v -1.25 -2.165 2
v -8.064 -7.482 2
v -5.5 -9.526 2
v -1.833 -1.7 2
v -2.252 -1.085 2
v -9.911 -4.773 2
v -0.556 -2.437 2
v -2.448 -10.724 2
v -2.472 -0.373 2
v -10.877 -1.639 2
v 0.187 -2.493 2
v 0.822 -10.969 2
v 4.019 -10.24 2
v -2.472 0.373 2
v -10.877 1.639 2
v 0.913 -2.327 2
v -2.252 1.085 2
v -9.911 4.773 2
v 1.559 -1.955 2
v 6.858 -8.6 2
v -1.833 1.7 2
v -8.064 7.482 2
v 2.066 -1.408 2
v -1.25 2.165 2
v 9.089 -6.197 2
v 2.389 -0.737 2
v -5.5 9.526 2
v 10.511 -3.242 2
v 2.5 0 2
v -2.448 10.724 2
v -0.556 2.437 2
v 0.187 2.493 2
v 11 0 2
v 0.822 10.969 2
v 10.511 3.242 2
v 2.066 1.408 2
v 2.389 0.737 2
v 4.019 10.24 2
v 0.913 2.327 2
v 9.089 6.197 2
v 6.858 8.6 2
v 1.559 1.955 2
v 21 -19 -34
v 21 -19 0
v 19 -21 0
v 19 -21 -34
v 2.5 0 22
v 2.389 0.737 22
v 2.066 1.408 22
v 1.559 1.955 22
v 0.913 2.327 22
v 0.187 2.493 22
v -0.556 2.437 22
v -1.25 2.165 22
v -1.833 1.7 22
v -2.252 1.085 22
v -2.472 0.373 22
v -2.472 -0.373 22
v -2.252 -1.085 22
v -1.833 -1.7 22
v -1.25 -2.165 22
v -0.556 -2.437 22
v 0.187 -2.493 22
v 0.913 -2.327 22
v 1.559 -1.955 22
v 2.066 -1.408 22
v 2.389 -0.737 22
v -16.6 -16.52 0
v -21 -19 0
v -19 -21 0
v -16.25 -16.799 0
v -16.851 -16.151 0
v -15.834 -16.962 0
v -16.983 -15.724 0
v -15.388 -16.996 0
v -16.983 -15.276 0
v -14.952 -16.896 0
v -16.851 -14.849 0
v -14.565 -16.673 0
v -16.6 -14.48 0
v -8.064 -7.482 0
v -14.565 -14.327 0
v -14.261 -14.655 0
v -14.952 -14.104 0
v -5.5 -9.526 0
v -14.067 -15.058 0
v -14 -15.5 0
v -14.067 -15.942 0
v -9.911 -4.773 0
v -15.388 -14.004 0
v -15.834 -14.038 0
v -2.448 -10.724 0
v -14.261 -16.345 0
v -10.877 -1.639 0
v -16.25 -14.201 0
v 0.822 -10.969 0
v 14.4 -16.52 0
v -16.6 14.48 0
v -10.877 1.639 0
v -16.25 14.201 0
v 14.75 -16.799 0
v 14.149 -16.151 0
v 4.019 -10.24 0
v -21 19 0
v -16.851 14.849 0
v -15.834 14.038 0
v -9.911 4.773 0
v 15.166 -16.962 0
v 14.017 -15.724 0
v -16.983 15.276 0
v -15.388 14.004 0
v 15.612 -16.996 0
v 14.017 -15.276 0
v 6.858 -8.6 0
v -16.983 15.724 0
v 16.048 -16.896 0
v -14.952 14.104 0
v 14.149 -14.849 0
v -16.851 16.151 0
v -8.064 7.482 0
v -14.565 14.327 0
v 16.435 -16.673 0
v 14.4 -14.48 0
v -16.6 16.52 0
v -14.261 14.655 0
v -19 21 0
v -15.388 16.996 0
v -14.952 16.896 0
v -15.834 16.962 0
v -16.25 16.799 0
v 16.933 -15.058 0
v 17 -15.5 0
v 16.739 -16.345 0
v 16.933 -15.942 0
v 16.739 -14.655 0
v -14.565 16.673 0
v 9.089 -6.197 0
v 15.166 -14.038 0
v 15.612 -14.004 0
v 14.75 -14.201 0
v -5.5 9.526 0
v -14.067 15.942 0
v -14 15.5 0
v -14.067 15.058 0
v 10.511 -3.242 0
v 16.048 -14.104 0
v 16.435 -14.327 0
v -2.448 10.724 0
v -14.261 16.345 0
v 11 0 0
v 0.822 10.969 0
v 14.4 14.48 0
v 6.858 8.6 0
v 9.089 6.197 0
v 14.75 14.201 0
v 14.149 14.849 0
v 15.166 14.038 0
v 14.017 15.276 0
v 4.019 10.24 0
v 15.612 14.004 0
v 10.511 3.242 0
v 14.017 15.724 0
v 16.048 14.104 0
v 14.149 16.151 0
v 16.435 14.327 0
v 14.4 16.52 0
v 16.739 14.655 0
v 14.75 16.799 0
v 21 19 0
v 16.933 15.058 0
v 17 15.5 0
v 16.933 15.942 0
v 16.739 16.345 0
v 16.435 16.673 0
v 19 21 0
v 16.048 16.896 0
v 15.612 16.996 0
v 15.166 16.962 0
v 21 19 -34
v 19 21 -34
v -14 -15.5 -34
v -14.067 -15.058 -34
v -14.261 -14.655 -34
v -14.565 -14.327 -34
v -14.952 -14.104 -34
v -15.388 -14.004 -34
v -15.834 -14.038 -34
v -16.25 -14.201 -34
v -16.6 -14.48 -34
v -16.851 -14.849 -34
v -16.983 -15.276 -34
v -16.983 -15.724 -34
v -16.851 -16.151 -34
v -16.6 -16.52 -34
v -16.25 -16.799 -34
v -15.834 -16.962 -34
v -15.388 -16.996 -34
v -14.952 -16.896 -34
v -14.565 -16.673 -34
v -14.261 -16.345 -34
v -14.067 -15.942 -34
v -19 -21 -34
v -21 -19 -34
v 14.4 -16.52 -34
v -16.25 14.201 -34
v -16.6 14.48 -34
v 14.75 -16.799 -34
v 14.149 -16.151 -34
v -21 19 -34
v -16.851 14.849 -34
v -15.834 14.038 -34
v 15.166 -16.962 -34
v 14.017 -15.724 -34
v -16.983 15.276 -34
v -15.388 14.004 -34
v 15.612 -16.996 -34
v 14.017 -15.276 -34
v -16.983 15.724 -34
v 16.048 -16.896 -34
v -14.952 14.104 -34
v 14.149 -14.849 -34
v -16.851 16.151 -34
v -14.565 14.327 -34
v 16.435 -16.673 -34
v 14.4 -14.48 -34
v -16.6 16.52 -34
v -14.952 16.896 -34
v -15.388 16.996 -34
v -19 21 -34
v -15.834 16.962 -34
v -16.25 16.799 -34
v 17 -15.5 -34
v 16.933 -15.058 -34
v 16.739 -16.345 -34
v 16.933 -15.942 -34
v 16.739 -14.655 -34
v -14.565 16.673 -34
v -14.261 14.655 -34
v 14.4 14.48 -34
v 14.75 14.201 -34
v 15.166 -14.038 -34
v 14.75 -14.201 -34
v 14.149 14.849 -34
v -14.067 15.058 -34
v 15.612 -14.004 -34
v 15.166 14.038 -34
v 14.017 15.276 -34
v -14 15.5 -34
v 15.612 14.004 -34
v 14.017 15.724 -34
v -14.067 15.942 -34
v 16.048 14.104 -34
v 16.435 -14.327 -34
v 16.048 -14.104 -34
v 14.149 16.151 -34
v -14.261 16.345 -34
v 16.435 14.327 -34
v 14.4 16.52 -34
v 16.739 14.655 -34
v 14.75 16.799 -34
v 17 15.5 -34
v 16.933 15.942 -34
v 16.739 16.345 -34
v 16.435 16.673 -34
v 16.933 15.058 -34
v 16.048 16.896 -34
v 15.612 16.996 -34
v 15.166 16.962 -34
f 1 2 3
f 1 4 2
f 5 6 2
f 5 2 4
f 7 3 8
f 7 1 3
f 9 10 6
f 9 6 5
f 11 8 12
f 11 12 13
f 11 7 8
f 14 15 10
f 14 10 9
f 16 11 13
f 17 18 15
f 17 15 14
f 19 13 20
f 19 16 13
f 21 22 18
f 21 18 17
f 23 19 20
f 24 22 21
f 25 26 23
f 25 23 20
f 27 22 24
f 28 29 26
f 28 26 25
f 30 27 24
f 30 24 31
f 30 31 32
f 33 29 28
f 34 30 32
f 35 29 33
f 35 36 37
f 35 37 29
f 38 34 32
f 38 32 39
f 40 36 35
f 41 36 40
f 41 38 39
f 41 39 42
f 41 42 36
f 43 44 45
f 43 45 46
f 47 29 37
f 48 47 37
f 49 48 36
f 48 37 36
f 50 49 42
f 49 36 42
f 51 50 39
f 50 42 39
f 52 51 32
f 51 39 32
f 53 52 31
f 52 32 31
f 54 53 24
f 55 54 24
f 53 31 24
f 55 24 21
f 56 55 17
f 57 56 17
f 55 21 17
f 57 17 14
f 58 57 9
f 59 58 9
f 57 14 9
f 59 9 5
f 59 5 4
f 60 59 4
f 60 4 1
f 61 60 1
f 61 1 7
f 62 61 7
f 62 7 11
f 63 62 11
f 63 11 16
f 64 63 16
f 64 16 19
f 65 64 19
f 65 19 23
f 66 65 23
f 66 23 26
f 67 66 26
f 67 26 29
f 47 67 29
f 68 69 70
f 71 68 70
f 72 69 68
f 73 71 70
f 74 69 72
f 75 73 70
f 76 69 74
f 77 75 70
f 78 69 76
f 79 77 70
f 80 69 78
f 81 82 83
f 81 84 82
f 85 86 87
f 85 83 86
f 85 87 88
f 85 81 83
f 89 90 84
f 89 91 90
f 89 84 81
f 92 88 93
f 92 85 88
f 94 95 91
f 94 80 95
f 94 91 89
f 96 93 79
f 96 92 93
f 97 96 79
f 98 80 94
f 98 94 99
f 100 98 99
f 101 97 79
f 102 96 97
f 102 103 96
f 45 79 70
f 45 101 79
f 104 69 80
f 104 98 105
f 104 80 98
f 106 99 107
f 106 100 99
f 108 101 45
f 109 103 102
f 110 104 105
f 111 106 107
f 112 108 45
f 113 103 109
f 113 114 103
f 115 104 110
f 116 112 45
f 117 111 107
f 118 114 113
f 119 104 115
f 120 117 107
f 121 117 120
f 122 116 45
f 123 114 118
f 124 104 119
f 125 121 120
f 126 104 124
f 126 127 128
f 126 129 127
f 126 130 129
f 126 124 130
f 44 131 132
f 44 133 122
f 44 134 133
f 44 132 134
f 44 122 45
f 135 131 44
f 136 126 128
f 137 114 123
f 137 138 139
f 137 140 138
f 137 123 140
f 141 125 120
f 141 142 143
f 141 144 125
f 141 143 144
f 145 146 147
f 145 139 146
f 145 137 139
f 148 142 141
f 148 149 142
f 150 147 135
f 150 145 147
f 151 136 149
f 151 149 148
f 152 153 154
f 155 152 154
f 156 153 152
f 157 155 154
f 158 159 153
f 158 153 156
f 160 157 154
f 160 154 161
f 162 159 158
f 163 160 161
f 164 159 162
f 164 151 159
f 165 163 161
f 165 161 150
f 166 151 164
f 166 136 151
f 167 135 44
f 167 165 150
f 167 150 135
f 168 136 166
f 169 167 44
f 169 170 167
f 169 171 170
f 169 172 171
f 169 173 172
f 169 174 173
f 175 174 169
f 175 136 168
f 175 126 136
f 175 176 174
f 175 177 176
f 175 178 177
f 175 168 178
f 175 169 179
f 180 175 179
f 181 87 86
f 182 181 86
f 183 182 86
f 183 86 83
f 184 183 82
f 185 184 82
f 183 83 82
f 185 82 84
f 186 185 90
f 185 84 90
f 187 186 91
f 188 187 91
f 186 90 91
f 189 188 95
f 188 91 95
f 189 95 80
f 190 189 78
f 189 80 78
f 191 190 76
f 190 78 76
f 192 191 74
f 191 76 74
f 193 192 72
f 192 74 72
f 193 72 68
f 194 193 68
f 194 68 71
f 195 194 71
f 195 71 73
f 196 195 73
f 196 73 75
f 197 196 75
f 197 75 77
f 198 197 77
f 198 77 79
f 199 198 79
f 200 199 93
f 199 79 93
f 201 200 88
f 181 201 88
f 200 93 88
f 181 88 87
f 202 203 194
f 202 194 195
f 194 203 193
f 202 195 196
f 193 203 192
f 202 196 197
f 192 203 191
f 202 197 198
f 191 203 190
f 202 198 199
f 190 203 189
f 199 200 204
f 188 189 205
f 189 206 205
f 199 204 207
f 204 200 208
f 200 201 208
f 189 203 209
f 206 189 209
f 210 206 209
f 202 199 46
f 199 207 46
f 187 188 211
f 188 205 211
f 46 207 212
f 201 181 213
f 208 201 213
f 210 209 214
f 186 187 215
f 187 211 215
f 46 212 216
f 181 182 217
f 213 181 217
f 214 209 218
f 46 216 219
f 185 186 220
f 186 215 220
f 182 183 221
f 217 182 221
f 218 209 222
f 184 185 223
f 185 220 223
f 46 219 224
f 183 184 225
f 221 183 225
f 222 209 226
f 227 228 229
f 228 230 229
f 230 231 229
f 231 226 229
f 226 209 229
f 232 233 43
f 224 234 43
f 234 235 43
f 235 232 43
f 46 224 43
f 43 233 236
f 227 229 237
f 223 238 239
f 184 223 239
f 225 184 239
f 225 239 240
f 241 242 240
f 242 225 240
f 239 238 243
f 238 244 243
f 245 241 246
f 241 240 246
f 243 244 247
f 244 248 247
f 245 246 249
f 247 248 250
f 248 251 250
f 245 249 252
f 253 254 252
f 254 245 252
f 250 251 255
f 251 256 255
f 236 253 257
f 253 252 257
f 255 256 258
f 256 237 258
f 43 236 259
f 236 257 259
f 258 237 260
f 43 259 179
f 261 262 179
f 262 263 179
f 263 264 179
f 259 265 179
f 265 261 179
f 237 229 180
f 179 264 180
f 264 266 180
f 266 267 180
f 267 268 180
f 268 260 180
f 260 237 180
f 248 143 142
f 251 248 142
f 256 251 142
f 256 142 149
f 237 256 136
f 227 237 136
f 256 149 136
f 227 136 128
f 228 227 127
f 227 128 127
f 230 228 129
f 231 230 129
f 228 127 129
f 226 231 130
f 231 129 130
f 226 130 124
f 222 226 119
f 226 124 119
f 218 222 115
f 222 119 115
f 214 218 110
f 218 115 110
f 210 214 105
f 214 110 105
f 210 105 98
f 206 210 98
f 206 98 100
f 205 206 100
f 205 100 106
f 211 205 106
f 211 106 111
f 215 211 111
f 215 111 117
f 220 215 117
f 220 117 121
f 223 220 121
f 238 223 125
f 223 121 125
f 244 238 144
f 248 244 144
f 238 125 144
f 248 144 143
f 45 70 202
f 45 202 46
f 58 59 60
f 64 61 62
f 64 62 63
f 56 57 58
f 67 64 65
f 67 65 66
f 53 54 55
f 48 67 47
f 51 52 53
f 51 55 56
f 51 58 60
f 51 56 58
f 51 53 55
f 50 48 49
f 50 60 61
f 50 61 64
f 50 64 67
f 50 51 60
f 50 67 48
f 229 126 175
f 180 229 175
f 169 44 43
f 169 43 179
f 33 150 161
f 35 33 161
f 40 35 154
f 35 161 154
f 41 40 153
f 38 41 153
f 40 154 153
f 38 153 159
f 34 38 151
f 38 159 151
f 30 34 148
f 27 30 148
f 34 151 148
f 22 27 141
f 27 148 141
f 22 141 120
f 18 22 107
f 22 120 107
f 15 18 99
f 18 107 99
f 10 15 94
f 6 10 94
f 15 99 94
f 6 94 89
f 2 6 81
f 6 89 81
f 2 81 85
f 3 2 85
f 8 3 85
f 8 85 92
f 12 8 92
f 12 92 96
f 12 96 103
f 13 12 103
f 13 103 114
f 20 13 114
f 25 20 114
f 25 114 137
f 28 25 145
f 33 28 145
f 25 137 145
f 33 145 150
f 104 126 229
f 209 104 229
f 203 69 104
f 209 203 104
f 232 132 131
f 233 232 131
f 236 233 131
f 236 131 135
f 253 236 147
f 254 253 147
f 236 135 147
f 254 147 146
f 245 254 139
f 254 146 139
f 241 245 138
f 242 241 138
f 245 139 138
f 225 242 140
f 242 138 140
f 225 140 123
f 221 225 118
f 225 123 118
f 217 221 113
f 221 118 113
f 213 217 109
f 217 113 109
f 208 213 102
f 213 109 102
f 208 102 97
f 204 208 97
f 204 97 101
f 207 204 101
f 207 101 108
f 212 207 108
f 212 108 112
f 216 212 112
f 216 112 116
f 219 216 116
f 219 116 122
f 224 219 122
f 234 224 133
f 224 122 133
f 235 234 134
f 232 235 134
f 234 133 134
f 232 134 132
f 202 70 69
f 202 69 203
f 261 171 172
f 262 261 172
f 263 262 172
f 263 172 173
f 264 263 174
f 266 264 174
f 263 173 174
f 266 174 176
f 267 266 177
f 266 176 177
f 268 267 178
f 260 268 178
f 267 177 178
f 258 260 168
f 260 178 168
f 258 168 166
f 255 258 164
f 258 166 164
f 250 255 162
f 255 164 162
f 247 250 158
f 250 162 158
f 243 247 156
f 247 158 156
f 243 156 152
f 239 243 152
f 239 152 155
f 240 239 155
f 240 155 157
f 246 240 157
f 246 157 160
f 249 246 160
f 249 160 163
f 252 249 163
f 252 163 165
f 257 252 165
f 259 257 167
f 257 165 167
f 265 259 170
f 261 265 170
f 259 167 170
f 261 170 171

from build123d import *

# Parameters (mm, degrees)
SKETCH_1_W      = 42
SKETCH_1_H      = 42
SKETCH_1_R      = 1.5
EXTRUDE_1_DEPTH = 34
SKETCH_1_3_R    = 11
EXTRUDE_2_DEPTH = 2
SKETCH_1_4_R    = 2.5
EXTRUDE_3_DEPTH = 22
CHAMFER_1_SIZE  = 2


with BuildPart() as part:
    # 스케치1 → 보스-돌출1 (new body)
    with BuildSketch(Plane.XY):
        Rectangle(SKETCH_1_W, SKETCH_1_H)
        with Locations((-15.5, -15.5)):
            Circle(SKETCH_1_R, mode=Mode.SUBTRACT)
        with Locations((15.5, -15.5)):
            Circle(SKETCH_1_R, mode=Mode.SUBTRACT)
        with Locations((-15.5, 15.5)):
            Circle(SKETCH_1_R, mode=Mode.SUBTRACT)
        with Locations((15.5, 15.5)):
            Circle(SKETCH_1_R, mode=Mode.SUBTRACT)
    extrude(amount=-EXTRUDE_1_DEPTH)

    # 스케치1<3> → 보스-돌출2 (add)
    with BuildSketch(Plane.XY):
        Circle(SKETCH_1_3_R)
    extrude(amount=EXTRUDE_2_DEPTH)

    # 스케치1<4> → 보스-돌출3 (add)
    with BuildSketch(Plane.XY):
        Circle(SKETCH_1_4_R)
    extrude(amount=EXTRUDE_3_DEPTH)

    # 모따기1
    chamfer_1_edges = [part.edges().sort_by_distance(p)[0] for p in [
        (-21, 21, -17),
        (21, 21, -17),
        (21, -21, -17),
        (-21, -21, -17),
    ]]
    chamfer(chamfer_1_edges, length=CHAMFER_1_SIZE)


solid = part.part
